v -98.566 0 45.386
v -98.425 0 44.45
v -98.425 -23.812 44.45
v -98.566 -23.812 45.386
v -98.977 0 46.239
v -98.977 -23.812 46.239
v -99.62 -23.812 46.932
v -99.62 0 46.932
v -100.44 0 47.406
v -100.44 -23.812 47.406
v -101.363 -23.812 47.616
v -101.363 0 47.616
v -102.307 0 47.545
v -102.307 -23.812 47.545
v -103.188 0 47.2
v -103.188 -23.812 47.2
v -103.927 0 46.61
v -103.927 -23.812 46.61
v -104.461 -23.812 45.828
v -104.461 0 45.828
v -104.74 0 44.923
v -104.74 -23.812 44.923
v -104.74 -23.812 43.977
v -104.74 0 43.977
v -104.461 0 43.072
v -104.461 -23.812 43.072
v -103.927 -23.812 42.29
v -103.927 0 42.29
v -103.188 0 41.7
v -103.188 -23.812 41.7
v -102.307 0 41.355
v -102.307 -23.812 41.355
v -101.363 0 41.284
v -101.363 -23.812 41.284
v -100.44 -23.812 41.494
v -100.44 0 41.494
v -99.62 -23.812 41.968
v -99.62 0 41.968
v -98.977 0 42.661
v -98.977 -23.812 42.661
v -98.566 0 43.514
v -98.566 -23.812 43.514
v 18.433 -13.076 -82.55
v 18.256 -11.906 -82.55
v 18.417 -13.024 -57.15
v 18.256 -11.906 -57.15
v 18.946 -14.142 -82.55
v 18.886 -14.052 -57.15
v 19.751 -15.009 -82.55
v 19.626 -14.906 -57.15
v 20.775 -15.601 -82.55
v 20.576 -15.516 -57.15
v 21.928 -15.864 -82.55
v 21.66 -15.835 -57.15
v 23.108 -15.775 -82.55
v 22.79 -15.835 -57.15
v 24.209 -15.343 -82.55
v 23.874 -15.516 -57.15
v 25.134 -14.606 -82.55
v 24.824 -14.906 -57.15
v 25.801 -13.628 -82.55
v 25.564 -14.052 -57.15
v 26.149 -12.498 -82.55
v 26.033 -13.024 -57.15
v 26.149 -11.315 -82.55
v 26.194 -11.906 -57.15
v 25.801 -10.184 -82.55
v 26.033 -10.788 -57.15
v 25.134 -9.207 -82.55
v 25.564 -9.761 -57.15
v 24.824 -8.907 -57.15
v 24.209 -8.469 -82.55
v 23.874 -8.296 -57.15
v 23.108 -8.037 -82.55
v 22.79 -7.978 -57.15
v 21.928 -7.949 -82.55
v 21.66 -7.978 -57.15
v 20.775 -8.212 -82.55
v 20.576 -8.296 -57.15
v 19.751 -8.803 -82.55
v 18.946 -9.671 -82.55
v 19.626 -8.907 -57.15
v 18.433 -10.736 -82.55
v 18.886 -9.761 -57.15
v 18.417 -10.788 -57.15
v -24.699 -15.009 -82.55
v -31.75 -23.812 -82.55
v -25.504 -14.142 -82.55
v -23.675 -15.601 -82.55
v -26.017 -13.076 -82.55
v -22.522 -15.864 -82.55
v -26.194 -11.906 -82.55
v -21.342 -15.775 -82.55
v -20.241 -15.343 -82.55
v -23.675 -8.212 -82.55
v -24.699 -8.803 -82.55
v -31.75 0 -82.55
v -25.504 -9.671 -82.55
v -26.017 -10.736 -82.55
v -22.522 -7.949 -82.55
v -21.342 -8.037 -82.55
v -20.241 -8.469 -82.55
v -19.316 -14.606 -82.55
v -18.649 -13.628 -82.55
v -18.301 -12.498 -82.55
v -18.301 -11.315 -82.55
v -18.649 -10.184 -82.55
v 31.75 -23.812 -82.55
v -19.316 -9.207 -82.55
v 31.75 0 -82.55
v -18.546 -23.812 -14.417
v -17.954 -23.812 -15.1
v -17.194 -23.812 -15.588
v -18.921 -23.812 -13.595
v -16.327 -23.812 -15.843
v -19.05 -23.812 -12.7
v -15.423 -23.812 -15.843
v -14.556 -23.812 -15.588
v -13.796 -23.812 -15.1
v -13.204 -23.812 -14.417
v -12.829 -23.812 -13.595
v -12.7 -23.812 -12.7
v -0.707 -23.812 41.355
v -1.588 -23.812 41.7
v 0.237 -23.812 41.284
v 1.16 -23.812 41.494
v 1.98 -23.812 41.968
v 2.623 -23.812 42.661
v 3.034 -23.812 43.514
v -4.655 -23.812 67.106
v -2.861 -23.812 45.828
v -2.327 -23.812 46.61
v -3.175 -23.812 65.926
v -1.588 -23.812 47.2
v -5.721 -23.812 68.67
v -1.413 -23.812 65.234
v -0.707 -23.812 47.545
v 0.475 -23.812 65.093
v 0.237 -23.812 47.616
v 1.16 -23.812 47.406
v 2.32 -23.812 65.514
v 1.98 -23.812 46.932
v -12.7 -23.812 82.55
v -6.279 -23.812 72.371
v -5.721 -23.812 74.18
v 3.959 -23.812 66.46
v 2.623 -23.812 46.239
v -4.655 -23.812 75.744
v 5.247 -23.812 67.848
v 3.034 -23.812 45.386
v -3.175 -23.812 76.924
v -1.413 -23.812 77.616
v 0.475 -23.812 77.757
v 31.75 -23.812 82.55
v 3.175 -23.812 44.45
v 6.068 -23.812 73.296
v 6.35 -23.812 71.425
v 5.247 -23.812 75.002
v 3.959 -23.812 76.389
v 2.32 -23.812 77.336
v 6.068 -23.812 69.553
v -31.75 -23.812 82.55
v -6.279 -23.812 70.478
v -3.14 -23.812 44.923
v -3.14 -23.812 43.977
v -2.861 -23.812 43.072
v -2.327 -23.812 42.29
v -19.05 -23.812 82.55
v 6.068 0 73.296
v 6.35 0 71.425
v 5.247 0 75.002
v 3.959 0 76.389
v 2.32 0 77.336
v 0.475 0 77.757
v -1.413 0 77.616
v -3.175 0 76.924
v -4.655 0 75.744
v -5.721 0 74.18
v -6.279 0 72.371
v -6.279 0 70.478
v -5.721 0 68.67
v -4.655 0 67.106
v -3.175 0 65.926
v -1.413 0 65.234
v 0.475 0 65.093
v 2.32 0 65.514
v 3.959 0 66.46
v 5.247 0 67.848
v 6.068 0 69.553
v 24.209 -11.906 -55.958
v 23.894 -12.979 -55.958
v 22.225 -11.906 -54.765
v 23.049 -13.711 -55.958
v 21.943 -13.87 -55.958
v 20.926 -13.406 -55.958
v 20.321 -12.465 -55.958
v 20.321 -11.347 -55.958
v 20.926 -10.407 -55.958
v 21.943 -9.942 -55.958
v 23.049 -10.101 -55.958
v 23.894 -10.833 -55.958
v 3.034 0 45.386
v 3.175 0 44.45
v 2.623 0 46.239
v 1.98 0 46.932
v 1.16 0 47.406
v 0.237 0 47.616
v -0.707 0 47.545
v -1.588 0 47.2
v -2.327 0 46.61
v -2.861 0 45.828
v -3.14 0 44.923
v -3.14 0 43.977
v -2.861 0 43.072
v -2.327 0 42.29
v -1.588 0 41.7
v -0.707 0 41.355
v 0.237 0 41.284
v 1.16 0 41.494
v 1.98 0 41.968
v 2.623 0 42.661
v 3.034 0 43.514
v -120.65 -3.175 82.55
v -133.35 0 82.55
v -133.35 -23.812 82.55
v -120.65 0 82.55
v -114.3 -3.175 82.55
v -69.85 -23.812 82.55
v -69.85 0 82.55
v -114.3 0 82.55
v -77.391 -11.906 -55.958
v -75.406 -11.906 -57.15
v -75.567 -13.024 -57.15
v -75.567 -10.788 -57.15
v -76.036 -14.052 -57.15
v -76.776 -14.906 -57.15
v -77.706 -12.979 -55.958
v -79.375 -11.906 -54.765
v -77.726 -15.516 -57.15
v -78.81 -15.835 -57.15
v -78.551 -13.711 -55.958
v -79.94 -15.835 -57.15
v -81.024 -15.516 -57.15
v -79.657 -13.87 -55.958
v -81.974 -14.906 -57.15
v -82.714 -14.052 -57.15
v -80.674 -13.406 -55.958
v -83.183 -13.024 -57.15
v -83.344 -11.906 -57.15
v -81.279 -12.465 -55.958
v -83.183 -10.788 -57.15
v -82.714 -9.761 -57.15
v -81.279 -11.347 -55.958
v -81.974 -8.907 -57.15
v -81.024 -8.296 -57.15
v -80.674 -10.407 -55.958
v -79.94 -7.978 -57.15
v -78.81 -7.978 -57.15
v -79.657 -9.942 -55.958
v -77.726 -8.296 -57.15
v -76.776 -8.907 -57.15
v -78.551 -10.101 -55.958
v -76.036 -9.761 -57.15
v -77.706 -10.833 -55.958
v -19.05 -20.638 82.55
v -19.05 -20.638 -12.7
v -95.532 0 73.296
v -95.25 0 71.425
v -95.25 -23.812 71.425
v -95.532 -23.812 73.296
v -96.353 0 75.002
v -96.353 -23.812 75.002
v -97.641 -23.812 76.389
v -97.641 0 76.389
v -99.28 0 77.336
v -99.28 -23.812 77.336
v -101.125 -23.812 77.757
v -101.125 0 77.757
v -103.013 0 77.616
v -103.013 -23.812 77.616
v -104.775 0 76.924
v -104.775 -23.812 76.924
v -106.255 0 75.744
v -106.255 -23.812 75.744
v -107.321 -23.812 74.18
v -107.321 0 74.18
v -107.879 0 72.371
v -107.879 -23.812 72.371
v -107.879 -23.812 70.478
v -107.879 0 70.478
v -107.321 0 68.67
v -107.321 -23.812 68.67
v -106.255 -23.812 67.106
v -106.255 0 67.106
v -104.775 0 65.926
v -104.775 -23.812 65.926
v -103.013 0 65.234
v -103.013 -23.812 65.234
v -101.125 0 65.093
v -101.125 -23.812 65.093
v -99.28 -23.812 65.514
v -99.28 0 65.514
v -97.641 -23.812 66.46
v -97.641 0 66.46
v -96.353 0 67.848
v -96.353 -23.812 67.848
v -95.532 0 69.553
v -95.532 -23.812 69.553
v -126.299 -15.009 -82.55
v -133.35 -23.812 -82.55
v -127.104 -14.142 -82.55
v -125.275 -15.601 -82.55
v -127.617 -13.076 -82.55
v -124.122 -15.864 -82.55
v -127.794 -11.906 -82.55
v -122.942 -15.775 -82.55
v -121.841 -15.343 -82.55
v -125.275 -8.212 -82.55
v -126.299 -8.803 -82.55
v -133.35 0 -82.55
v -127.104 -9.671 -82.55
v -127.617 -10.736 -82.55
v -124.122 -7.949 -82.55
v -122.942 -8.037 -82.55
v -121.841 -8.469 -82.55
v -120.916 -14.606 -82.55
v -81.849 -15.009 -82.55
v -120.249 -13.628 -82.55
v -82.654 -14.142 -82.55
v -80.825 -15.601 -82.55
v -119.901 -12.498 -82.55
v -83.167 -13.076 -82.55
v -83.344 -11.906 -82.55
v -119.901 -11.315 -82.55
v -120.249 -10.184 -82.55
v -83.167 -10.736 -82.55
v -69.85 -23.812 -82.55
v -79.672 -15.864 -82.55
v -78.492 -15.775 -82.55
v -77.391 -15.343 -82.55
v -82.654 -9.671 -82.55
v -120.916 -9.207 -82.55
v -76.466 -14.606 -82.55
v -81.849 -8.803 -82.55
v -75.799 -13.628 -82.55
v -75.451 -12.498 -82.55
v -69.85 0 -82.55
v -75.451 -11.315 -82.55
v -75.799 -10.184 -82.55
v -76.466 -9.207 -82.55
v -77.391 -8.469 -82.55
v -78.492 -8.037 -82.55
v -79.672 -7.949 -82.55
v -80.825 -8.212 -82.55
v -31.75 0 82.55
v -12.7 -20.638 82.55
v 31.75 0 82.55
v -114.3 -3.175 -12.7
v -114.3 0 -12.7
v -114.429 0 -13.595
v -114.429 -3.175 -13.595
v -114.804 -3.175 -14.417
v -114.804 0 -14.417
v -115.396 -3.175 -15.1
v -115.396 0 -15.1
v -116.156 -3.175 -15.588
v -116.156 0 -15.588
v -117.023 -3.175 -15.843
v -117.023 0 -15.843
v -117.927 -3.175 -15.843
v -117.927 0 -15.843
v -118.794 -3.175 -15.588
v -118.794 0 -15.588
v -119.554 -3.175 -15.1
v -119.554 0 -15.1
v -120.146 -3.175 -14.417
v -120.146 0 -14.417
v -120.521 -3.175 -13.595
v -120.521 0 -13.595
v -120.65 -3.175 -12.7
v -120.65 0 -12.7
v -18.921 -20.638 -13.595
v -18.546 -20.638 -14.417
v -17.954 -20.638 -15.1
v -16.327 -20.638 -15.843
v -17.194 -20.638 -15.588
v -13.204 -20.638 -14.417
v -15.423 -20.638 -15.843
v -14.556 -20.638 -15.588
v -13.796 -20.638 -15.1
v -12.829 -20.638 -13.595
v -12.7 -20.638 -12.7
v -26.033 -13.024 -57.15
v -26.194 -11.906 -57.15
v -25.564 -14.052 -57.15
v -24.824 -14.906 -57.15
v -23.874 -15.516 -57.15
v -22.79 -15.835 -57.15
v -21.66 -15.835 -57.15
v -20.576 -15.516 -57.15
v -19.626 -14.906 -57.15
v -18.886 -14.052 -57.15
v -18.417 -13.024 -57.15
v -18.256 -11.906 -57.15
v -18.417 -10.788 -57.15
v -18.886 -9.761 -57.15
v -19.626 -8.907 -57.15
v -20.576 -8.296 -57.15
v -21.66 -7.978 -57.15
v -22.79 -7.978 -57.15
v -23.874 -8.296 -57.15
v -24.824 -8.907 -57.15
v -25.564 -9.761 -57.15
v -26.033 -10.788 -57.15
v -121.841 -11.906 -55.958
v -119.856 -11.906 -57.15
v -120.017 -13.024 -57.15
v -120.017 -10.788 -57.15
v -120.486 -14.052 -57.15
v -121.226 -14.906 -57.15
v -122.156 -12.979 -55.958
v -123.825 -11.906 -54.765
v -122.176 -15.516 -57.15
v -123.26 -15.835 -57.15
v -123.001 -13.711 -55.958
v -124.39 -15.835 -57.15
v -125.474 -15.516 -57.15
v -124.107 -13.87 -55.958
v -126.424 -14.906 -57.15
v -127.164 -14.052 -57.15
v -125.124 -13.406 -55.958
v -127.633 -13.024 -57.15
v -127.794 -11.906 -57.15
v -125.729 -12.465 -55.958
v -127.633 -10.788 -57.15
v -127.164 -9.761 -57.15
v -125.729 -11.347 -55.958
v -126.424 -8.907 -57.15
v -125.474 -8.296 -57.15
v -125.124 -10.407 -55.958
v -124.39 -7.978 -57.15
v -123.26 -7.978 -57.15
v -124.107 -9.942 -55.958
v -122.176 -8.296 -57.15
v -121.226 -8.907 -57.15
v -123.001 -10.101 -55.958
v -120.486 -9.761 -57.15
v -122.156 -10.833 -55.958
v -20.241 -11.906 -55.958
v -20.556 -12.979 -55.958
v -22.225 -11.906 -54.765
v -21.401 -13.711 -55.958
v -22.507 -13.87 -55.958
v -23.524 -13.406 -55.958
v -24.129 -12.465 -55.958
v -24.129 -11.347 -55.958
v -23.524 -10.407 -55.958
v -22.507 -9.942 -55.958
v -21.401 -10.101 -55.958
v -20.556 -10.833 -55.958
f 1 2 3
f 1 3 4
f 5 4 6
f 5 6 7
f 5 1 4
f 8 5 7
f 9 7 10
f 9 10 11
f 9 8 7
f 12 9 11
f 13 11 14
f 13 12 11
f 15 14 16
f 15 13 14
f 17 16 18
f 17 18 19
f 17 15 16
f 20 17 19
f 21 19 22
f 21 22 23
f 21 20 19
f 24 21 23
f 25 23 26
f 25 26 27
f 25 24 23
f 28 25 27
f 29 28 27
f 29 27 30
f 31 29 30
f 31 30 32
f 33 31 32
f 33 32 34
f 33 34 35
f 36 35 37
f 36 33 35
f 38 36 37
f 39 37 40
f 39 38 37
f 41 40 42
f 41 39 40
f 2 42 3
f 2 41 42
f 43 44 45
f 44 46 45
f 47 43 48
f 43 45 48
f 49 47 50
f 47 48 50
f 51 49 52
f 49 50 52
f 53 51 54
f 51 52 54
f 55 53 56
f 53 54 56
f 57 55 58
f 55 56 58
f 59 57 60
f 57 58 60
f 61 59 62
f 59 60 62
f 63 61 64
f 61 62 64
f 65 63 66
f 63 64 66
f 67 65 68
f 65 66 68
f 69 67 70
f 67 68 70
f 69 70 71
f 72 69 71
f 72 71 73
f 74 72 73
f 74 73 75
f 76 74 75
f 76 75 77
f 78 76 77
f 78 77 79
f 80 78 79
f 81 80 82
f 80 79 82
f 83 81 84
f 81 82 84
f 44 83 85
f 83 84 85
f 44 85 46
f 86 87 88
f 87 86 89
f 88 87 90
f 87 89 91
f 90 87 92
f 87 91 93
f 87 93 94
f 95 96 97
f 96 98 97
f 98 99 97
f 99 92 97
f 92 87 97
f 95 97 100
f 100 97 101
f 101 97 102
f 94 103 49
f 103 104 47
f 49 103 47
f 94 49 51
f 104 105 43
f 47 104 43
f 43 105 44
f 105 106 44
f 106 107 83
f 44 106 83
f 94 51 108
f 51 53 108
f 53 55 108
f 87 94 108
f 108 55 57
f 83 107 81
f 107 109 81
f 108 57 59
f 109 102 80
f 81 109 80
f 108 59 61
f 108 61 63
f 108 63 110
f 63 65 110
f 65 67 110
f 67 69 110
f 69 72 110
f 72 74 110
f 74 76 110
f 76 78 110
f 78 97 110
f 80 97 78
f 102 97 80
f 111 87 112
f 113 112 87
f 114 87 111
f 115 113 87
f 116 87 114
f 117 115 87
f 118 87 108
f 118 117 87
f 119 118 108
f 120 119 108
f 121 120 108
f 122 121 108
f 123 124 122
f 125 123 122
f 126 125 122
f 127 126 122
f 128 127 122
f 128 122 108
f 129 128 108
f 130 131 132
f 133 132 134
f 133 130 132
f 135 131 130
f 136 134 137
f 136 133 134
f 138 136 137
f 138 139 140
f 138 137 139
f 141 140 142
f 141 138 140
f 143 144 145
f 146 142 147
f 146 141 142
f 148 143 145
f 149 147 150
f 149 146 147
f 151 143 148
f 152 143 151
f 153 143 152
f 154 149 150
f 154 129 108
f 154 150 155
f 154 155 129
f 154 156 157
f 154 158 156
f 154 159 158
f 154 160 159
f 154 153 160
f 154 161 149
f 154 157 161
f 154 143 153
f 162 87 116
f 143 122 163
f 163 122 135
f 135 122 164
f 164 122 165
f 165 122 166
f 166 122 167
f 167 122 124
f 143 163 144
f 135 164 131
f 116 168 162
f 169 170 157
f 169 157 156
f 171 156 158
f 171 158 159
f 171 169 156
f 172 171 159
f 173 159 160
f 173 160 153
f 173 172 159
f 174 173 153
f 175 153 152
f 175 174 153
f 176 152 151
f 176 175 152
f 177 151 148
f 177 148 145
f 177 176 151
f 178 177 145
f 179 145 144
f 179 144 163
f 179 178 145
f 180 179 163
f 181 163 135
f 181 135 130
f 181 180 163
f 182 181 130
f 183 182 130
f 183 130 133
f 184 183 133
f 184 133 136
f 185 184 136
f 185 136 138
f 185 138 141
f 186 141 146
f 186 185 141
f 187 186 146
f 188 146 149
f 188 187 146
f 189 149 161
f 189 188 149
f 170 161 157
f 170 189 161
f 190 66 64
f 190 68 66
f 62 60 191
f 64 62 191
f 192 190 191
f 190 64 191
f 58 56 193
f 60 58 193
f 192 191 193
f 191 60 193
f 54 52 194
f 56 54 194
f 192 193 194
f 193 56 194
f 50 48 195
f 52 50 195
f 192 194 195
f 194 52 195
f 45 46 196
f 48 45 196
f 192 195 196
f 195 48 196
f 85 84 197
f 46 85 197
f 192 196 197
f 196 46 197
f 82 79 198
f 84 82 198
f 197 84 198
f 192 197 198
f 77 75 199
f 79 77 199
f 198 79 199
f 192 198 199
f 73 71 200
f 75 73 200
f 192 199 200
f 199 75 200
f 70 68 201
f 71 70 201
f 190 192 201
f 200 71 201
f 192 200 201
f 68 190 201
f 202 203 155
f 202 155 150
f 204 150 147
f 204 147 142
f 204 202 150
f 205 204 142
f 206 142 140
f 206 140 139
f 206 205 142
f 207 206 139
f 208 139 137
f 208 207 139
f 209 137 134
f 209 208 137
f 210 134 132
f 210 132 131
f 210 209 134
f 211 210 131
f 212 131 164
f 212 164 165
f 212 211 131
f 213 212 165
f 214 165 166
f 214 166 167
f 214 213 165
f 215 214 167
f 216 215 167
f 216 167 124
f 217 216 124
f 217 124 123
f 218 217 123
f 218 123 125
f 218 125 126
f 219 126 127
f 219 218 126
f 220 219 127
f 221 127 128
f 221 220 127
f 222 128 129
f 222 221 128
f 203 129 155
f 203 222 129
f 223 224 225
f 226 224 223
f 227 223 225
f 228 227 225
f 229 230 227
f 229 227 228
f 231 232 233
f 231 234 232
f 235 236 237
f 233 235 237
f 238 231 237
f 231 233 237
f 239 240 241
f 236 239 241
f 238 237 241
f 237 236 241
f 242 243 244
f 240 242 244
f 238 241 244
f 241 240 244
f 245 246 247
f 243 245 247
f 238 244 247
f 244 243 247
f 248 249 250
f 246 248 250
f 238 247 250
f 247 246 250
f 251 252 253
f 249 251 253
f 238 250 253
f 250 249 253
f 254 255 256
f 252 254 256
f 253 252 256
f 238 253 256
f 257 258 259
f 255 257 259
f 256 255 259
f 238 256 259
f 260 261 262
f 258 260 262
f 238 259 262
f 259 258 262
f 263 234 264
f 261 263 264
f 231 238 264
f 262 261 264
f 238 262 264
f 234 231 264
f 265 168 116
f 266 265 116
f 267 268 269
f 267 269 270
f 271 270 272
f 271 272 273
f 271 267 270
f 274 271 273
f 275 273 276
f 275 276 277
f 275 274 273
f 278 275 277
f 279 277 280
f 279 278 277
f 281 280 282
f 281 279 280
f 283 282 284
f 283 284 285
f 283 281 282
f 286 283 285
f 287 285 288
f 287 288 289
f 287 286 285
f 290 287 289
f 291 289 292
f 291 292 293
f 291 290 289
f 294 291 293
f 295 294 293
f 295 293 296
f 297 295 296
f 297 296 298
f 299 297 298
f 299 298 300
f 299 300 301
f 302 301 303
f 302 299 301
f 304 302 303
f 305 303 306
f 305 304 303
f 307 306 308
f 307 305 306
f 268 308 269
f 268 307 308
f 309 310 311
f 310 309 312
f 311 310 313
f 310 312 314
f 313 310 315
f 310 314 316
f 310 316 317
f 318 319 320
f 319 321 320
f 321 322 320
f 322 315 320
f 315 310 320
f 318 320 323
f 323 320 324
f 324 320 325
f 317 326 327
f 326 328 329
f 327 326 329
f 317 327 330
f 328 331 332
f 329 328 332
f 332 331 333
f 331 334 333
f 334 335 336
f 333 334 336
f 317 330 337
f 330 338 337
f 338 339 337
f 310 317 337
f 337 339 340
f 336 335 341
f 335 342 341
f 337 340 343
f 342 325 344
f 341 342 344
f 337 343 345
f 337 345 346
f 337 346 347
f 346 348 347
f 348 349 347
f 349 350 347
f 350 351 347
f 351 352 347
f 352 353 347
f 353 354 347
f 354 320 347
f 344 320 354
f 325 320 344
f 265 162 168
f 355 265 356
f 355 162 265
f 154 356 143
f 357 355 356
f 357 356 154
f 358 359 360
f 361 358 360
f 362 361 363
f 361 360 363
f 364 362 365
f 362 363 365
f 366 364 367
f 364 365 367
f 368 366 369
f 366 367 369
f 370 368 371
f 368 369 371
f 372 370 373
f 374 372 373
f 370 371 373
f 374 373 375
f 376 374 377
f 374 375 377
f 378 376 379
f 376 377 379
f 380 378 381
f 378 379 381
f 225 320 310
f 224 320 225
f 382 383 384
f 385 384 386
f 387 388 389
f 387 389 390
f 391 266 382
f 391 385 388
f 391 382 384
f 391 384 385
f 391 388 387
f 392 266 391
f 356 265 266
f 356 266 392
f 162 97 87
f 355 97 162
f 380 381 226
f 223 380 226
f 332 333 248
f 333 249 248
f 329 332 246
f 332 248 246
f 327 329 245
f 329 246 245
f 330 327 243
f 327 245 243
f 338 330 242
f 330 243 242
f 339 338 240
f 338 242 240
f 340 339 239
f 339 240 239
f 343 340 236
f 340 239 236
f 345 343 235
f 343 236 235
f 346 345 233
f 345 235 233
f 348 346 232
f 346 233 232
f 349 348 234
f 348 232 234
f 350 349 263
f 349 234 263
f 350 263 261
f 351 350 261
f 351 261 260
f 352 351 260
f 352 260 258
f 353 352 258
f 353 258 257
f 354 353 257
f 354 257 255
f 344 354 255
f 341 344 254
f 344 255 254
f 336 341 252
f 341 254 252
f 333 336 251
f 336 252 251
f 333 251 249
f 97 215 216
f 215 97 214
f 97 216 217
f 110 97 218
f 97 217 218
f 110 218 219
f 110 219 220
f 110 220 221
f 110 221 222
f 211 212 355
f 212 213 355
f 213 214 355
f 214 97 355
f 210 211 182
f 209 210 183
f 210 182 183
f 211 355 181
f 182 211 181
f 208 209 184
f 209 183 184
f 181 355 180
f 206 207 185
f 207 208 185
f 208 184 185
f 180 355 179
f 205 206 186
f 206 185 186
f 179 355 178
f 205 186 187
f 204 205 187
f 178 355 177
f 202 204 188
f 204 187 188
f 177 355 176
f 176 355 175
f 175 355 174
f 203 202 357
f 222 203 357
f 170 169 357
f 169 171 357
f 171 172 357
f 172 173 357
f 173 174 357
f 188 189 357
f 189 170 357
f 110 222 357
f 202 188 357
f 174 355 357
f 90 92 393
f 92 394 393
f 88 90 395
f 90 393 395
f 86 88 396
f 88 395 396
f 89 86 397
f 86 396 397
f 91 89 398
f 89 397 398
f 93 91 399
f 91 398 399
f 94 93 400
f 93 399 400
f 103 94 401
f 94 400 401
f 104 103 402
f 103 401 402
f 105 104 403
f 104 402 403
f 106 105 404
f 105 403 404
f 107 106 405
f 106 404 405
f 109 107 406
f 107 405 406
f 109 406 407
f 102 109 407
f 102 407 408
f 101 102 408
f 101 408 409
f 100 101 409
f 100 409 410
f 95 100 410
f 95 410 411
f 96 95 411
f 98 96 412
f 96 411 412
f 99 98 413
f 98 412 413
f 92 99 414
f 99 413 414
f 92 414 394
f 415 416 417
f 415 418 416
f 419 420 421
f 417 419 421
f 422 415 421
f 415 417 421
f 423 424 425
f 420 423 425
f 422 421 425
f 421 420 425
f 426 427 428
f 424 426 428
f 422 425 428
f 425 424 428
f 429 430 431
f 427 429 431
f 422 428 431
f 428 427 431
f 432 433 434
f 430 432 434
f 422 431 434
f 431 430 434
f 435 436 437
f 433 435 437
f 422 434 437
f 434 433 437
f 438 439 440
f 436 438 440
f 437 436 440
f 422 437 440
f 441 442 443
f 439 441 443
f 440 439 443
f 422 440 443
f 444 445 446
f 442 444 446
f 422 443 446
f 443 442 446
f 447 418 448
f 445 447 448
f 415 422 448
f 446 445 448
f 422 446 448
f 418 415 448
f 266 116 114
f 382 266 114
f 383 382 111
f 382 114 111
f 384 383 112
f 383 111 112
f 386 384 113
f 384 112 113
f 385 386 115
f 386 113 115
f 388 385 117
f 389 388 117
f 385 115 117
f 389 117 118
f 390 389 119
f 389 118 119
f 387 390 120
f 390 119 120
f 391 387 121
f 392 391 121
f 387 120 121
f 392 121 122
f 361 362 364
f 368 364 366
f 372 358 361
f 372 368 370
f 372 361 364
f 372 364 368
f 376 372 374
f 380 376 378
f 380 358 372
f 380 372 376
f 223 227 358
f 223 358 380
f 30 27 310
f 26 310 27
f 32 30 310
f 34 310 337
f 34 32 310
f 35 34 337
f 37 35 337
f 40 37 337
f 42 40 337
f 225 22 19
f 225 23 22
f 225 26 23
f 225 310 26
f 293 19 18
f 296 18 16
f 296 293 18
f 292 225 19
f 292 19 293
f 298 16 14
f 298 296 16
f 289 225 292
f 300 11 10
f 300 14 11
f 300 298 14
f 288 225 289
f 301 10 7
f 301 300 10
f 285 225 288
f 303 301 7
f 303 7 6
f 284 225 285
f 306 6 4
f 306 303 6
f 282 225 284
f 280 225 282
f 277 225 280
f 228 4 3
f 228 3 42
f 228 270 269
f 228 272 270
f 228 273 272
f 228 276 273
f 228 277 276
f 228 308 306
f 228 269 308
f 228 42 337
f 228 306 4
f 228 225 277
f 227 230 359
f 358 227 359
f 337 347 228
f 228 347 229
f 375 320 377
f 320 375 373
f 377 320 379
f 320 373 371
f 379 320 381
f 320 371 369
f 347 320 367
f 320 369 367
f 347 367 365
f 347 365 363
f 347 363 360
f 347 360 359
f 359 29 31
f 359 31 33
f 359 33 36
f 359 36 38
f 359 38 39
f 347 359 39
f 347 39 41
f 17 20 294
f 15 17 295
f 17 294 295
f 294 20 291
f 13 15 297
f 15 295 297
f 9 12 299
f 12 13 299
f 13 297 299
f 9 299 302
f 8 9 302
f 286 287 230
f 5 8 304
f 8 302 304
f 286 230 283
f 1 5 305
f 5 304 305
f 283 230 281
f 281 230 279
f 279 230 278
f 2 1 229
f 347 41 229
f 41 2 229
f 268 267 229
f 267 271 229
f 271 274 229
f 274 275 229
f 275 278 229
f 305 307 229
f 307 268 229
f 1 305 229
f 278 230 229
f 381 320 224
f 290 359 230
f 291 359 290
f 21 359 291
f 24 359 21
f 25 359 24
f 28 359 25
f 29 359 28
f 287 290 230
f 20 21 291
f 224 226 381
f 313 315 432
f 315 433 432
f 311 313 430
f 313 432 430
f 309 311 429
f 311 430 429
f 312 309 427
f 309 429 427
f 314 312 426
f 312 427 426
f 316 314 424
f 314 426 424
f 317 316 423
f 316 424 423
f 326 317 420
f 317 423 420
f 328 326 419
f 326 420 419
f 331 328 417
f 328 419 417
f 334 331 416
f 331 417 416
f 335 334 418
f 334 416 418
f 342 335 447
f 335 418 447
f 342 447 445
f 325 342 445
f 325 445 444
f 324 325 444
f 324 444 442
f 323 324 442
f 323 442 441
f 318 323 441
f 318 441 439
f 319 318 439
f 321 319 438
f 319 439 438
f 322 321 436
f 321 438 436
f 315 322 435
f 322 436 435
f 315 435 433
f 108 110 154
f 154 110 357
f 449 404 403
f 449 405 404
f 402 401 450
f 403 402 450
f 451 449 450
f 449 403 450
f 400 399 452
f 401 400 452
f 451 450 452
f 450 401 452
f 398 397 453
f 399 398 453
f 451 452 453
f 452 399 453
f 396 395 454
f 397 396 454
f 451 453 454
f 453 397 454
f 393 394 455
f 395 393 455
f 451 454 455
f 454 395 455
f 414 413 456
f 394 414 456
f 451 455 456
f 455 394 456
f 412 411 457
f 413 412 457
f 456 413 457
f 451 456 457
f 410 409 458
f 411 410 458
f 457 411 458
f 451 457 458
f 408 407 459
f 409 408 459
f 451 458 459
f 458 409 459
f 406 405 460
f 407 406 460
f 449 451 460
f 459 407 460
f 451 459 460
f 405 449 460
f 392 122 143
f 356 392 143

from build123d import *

# Parameters (mm, degrees)
F0_W     = 63.5
F0_H     = 165.1
F0_R     = 3.175
F0_R_2   = 6.35
F1_DEPTH = 23.8125
F3_D     = 7.9375
F3_DEPTH = 25.4
F3_TIP   = 2.3846655818
F6_DEPTH = 3.175
F8_DEPTH = 3.175


with BuildPart() as f1:
    # F0 (on Front) → F1 (new body)
    with BuildSketch(Plane.XZ):
        Rectangle(F0_W, F0_H)
        with Locations((0, 44.45)):
            Circle(F0_R, mode=Mode.SUBTRACT)
        with Locations((0, 71.4248)):
            Circle(F0_R_2, mode=Mode.SUBTRACT)
    extrude(amount=F1_DEPTH)

    # F3
    with Locations(Plane(origin=(0, 0, -82.55), x_dir=(1, 0, 0), z_dir=(0, 0, -1))):
        with Locations((-22.225, 11.90625), (22.225, 11.90625)):
            Hole(F3_D / 2, depth=F3_DEPTH)
            with Locations((0, 0, -(F3_DEPTH + F3_TIP / 2))):  # 118° drill point
                Cone(0, F3_D / 2, F3_TIP, mode=Mode.SUBTRACT)


with BuildPart() as f4_1:
    # F4: copy of F1
    add(f1.part.moved(Location((-101.6, 0, 0))))

    # F7 (on face) → F8 (cut)
    with BuildSketch(Plane(origin=(0, 0, 0), x_dir=(-1, 0, 0), z_dir=(0, 1, 0))):
        with BuildLine():
            Line((120.65, 82.55), (114.3, 82.55))
            Line((114.3, 82.55), (114.3, -12.7))
            ThreePointArc((114.3, -12.7), (117.475, -15.875), (120.65, -12.7))
            Line((120.65, -12.7), (120.65, 82.55))
        make_face()
    extrude(amount=-F8_DEPTH, mode=Mode.SUBTRACT)


with BuildPart() as f1_1:
    add(f1.part)

    # F5 (on face) → F6 (cut)
    with BuildSketch(Plane.XZ.offset(23.8125)):
        with BuildLine():
            Line((-12.7, 82.55), (-19.05, 82.55))
            Line((-19.05, 82.55), (-19.05, -12.7))
            ThreePointArc((-19.05, -12.7), (-15.875, -15.875), (-12.7, -12.7))
            Line((-12.7, -12.7), (-12.7, 82.55))
        make_face()
    extrude(amount=-F6_DEPTH, mode=Mode.SUBTRACT)


solid = Compound([f4_1.part, f1_1.part])
